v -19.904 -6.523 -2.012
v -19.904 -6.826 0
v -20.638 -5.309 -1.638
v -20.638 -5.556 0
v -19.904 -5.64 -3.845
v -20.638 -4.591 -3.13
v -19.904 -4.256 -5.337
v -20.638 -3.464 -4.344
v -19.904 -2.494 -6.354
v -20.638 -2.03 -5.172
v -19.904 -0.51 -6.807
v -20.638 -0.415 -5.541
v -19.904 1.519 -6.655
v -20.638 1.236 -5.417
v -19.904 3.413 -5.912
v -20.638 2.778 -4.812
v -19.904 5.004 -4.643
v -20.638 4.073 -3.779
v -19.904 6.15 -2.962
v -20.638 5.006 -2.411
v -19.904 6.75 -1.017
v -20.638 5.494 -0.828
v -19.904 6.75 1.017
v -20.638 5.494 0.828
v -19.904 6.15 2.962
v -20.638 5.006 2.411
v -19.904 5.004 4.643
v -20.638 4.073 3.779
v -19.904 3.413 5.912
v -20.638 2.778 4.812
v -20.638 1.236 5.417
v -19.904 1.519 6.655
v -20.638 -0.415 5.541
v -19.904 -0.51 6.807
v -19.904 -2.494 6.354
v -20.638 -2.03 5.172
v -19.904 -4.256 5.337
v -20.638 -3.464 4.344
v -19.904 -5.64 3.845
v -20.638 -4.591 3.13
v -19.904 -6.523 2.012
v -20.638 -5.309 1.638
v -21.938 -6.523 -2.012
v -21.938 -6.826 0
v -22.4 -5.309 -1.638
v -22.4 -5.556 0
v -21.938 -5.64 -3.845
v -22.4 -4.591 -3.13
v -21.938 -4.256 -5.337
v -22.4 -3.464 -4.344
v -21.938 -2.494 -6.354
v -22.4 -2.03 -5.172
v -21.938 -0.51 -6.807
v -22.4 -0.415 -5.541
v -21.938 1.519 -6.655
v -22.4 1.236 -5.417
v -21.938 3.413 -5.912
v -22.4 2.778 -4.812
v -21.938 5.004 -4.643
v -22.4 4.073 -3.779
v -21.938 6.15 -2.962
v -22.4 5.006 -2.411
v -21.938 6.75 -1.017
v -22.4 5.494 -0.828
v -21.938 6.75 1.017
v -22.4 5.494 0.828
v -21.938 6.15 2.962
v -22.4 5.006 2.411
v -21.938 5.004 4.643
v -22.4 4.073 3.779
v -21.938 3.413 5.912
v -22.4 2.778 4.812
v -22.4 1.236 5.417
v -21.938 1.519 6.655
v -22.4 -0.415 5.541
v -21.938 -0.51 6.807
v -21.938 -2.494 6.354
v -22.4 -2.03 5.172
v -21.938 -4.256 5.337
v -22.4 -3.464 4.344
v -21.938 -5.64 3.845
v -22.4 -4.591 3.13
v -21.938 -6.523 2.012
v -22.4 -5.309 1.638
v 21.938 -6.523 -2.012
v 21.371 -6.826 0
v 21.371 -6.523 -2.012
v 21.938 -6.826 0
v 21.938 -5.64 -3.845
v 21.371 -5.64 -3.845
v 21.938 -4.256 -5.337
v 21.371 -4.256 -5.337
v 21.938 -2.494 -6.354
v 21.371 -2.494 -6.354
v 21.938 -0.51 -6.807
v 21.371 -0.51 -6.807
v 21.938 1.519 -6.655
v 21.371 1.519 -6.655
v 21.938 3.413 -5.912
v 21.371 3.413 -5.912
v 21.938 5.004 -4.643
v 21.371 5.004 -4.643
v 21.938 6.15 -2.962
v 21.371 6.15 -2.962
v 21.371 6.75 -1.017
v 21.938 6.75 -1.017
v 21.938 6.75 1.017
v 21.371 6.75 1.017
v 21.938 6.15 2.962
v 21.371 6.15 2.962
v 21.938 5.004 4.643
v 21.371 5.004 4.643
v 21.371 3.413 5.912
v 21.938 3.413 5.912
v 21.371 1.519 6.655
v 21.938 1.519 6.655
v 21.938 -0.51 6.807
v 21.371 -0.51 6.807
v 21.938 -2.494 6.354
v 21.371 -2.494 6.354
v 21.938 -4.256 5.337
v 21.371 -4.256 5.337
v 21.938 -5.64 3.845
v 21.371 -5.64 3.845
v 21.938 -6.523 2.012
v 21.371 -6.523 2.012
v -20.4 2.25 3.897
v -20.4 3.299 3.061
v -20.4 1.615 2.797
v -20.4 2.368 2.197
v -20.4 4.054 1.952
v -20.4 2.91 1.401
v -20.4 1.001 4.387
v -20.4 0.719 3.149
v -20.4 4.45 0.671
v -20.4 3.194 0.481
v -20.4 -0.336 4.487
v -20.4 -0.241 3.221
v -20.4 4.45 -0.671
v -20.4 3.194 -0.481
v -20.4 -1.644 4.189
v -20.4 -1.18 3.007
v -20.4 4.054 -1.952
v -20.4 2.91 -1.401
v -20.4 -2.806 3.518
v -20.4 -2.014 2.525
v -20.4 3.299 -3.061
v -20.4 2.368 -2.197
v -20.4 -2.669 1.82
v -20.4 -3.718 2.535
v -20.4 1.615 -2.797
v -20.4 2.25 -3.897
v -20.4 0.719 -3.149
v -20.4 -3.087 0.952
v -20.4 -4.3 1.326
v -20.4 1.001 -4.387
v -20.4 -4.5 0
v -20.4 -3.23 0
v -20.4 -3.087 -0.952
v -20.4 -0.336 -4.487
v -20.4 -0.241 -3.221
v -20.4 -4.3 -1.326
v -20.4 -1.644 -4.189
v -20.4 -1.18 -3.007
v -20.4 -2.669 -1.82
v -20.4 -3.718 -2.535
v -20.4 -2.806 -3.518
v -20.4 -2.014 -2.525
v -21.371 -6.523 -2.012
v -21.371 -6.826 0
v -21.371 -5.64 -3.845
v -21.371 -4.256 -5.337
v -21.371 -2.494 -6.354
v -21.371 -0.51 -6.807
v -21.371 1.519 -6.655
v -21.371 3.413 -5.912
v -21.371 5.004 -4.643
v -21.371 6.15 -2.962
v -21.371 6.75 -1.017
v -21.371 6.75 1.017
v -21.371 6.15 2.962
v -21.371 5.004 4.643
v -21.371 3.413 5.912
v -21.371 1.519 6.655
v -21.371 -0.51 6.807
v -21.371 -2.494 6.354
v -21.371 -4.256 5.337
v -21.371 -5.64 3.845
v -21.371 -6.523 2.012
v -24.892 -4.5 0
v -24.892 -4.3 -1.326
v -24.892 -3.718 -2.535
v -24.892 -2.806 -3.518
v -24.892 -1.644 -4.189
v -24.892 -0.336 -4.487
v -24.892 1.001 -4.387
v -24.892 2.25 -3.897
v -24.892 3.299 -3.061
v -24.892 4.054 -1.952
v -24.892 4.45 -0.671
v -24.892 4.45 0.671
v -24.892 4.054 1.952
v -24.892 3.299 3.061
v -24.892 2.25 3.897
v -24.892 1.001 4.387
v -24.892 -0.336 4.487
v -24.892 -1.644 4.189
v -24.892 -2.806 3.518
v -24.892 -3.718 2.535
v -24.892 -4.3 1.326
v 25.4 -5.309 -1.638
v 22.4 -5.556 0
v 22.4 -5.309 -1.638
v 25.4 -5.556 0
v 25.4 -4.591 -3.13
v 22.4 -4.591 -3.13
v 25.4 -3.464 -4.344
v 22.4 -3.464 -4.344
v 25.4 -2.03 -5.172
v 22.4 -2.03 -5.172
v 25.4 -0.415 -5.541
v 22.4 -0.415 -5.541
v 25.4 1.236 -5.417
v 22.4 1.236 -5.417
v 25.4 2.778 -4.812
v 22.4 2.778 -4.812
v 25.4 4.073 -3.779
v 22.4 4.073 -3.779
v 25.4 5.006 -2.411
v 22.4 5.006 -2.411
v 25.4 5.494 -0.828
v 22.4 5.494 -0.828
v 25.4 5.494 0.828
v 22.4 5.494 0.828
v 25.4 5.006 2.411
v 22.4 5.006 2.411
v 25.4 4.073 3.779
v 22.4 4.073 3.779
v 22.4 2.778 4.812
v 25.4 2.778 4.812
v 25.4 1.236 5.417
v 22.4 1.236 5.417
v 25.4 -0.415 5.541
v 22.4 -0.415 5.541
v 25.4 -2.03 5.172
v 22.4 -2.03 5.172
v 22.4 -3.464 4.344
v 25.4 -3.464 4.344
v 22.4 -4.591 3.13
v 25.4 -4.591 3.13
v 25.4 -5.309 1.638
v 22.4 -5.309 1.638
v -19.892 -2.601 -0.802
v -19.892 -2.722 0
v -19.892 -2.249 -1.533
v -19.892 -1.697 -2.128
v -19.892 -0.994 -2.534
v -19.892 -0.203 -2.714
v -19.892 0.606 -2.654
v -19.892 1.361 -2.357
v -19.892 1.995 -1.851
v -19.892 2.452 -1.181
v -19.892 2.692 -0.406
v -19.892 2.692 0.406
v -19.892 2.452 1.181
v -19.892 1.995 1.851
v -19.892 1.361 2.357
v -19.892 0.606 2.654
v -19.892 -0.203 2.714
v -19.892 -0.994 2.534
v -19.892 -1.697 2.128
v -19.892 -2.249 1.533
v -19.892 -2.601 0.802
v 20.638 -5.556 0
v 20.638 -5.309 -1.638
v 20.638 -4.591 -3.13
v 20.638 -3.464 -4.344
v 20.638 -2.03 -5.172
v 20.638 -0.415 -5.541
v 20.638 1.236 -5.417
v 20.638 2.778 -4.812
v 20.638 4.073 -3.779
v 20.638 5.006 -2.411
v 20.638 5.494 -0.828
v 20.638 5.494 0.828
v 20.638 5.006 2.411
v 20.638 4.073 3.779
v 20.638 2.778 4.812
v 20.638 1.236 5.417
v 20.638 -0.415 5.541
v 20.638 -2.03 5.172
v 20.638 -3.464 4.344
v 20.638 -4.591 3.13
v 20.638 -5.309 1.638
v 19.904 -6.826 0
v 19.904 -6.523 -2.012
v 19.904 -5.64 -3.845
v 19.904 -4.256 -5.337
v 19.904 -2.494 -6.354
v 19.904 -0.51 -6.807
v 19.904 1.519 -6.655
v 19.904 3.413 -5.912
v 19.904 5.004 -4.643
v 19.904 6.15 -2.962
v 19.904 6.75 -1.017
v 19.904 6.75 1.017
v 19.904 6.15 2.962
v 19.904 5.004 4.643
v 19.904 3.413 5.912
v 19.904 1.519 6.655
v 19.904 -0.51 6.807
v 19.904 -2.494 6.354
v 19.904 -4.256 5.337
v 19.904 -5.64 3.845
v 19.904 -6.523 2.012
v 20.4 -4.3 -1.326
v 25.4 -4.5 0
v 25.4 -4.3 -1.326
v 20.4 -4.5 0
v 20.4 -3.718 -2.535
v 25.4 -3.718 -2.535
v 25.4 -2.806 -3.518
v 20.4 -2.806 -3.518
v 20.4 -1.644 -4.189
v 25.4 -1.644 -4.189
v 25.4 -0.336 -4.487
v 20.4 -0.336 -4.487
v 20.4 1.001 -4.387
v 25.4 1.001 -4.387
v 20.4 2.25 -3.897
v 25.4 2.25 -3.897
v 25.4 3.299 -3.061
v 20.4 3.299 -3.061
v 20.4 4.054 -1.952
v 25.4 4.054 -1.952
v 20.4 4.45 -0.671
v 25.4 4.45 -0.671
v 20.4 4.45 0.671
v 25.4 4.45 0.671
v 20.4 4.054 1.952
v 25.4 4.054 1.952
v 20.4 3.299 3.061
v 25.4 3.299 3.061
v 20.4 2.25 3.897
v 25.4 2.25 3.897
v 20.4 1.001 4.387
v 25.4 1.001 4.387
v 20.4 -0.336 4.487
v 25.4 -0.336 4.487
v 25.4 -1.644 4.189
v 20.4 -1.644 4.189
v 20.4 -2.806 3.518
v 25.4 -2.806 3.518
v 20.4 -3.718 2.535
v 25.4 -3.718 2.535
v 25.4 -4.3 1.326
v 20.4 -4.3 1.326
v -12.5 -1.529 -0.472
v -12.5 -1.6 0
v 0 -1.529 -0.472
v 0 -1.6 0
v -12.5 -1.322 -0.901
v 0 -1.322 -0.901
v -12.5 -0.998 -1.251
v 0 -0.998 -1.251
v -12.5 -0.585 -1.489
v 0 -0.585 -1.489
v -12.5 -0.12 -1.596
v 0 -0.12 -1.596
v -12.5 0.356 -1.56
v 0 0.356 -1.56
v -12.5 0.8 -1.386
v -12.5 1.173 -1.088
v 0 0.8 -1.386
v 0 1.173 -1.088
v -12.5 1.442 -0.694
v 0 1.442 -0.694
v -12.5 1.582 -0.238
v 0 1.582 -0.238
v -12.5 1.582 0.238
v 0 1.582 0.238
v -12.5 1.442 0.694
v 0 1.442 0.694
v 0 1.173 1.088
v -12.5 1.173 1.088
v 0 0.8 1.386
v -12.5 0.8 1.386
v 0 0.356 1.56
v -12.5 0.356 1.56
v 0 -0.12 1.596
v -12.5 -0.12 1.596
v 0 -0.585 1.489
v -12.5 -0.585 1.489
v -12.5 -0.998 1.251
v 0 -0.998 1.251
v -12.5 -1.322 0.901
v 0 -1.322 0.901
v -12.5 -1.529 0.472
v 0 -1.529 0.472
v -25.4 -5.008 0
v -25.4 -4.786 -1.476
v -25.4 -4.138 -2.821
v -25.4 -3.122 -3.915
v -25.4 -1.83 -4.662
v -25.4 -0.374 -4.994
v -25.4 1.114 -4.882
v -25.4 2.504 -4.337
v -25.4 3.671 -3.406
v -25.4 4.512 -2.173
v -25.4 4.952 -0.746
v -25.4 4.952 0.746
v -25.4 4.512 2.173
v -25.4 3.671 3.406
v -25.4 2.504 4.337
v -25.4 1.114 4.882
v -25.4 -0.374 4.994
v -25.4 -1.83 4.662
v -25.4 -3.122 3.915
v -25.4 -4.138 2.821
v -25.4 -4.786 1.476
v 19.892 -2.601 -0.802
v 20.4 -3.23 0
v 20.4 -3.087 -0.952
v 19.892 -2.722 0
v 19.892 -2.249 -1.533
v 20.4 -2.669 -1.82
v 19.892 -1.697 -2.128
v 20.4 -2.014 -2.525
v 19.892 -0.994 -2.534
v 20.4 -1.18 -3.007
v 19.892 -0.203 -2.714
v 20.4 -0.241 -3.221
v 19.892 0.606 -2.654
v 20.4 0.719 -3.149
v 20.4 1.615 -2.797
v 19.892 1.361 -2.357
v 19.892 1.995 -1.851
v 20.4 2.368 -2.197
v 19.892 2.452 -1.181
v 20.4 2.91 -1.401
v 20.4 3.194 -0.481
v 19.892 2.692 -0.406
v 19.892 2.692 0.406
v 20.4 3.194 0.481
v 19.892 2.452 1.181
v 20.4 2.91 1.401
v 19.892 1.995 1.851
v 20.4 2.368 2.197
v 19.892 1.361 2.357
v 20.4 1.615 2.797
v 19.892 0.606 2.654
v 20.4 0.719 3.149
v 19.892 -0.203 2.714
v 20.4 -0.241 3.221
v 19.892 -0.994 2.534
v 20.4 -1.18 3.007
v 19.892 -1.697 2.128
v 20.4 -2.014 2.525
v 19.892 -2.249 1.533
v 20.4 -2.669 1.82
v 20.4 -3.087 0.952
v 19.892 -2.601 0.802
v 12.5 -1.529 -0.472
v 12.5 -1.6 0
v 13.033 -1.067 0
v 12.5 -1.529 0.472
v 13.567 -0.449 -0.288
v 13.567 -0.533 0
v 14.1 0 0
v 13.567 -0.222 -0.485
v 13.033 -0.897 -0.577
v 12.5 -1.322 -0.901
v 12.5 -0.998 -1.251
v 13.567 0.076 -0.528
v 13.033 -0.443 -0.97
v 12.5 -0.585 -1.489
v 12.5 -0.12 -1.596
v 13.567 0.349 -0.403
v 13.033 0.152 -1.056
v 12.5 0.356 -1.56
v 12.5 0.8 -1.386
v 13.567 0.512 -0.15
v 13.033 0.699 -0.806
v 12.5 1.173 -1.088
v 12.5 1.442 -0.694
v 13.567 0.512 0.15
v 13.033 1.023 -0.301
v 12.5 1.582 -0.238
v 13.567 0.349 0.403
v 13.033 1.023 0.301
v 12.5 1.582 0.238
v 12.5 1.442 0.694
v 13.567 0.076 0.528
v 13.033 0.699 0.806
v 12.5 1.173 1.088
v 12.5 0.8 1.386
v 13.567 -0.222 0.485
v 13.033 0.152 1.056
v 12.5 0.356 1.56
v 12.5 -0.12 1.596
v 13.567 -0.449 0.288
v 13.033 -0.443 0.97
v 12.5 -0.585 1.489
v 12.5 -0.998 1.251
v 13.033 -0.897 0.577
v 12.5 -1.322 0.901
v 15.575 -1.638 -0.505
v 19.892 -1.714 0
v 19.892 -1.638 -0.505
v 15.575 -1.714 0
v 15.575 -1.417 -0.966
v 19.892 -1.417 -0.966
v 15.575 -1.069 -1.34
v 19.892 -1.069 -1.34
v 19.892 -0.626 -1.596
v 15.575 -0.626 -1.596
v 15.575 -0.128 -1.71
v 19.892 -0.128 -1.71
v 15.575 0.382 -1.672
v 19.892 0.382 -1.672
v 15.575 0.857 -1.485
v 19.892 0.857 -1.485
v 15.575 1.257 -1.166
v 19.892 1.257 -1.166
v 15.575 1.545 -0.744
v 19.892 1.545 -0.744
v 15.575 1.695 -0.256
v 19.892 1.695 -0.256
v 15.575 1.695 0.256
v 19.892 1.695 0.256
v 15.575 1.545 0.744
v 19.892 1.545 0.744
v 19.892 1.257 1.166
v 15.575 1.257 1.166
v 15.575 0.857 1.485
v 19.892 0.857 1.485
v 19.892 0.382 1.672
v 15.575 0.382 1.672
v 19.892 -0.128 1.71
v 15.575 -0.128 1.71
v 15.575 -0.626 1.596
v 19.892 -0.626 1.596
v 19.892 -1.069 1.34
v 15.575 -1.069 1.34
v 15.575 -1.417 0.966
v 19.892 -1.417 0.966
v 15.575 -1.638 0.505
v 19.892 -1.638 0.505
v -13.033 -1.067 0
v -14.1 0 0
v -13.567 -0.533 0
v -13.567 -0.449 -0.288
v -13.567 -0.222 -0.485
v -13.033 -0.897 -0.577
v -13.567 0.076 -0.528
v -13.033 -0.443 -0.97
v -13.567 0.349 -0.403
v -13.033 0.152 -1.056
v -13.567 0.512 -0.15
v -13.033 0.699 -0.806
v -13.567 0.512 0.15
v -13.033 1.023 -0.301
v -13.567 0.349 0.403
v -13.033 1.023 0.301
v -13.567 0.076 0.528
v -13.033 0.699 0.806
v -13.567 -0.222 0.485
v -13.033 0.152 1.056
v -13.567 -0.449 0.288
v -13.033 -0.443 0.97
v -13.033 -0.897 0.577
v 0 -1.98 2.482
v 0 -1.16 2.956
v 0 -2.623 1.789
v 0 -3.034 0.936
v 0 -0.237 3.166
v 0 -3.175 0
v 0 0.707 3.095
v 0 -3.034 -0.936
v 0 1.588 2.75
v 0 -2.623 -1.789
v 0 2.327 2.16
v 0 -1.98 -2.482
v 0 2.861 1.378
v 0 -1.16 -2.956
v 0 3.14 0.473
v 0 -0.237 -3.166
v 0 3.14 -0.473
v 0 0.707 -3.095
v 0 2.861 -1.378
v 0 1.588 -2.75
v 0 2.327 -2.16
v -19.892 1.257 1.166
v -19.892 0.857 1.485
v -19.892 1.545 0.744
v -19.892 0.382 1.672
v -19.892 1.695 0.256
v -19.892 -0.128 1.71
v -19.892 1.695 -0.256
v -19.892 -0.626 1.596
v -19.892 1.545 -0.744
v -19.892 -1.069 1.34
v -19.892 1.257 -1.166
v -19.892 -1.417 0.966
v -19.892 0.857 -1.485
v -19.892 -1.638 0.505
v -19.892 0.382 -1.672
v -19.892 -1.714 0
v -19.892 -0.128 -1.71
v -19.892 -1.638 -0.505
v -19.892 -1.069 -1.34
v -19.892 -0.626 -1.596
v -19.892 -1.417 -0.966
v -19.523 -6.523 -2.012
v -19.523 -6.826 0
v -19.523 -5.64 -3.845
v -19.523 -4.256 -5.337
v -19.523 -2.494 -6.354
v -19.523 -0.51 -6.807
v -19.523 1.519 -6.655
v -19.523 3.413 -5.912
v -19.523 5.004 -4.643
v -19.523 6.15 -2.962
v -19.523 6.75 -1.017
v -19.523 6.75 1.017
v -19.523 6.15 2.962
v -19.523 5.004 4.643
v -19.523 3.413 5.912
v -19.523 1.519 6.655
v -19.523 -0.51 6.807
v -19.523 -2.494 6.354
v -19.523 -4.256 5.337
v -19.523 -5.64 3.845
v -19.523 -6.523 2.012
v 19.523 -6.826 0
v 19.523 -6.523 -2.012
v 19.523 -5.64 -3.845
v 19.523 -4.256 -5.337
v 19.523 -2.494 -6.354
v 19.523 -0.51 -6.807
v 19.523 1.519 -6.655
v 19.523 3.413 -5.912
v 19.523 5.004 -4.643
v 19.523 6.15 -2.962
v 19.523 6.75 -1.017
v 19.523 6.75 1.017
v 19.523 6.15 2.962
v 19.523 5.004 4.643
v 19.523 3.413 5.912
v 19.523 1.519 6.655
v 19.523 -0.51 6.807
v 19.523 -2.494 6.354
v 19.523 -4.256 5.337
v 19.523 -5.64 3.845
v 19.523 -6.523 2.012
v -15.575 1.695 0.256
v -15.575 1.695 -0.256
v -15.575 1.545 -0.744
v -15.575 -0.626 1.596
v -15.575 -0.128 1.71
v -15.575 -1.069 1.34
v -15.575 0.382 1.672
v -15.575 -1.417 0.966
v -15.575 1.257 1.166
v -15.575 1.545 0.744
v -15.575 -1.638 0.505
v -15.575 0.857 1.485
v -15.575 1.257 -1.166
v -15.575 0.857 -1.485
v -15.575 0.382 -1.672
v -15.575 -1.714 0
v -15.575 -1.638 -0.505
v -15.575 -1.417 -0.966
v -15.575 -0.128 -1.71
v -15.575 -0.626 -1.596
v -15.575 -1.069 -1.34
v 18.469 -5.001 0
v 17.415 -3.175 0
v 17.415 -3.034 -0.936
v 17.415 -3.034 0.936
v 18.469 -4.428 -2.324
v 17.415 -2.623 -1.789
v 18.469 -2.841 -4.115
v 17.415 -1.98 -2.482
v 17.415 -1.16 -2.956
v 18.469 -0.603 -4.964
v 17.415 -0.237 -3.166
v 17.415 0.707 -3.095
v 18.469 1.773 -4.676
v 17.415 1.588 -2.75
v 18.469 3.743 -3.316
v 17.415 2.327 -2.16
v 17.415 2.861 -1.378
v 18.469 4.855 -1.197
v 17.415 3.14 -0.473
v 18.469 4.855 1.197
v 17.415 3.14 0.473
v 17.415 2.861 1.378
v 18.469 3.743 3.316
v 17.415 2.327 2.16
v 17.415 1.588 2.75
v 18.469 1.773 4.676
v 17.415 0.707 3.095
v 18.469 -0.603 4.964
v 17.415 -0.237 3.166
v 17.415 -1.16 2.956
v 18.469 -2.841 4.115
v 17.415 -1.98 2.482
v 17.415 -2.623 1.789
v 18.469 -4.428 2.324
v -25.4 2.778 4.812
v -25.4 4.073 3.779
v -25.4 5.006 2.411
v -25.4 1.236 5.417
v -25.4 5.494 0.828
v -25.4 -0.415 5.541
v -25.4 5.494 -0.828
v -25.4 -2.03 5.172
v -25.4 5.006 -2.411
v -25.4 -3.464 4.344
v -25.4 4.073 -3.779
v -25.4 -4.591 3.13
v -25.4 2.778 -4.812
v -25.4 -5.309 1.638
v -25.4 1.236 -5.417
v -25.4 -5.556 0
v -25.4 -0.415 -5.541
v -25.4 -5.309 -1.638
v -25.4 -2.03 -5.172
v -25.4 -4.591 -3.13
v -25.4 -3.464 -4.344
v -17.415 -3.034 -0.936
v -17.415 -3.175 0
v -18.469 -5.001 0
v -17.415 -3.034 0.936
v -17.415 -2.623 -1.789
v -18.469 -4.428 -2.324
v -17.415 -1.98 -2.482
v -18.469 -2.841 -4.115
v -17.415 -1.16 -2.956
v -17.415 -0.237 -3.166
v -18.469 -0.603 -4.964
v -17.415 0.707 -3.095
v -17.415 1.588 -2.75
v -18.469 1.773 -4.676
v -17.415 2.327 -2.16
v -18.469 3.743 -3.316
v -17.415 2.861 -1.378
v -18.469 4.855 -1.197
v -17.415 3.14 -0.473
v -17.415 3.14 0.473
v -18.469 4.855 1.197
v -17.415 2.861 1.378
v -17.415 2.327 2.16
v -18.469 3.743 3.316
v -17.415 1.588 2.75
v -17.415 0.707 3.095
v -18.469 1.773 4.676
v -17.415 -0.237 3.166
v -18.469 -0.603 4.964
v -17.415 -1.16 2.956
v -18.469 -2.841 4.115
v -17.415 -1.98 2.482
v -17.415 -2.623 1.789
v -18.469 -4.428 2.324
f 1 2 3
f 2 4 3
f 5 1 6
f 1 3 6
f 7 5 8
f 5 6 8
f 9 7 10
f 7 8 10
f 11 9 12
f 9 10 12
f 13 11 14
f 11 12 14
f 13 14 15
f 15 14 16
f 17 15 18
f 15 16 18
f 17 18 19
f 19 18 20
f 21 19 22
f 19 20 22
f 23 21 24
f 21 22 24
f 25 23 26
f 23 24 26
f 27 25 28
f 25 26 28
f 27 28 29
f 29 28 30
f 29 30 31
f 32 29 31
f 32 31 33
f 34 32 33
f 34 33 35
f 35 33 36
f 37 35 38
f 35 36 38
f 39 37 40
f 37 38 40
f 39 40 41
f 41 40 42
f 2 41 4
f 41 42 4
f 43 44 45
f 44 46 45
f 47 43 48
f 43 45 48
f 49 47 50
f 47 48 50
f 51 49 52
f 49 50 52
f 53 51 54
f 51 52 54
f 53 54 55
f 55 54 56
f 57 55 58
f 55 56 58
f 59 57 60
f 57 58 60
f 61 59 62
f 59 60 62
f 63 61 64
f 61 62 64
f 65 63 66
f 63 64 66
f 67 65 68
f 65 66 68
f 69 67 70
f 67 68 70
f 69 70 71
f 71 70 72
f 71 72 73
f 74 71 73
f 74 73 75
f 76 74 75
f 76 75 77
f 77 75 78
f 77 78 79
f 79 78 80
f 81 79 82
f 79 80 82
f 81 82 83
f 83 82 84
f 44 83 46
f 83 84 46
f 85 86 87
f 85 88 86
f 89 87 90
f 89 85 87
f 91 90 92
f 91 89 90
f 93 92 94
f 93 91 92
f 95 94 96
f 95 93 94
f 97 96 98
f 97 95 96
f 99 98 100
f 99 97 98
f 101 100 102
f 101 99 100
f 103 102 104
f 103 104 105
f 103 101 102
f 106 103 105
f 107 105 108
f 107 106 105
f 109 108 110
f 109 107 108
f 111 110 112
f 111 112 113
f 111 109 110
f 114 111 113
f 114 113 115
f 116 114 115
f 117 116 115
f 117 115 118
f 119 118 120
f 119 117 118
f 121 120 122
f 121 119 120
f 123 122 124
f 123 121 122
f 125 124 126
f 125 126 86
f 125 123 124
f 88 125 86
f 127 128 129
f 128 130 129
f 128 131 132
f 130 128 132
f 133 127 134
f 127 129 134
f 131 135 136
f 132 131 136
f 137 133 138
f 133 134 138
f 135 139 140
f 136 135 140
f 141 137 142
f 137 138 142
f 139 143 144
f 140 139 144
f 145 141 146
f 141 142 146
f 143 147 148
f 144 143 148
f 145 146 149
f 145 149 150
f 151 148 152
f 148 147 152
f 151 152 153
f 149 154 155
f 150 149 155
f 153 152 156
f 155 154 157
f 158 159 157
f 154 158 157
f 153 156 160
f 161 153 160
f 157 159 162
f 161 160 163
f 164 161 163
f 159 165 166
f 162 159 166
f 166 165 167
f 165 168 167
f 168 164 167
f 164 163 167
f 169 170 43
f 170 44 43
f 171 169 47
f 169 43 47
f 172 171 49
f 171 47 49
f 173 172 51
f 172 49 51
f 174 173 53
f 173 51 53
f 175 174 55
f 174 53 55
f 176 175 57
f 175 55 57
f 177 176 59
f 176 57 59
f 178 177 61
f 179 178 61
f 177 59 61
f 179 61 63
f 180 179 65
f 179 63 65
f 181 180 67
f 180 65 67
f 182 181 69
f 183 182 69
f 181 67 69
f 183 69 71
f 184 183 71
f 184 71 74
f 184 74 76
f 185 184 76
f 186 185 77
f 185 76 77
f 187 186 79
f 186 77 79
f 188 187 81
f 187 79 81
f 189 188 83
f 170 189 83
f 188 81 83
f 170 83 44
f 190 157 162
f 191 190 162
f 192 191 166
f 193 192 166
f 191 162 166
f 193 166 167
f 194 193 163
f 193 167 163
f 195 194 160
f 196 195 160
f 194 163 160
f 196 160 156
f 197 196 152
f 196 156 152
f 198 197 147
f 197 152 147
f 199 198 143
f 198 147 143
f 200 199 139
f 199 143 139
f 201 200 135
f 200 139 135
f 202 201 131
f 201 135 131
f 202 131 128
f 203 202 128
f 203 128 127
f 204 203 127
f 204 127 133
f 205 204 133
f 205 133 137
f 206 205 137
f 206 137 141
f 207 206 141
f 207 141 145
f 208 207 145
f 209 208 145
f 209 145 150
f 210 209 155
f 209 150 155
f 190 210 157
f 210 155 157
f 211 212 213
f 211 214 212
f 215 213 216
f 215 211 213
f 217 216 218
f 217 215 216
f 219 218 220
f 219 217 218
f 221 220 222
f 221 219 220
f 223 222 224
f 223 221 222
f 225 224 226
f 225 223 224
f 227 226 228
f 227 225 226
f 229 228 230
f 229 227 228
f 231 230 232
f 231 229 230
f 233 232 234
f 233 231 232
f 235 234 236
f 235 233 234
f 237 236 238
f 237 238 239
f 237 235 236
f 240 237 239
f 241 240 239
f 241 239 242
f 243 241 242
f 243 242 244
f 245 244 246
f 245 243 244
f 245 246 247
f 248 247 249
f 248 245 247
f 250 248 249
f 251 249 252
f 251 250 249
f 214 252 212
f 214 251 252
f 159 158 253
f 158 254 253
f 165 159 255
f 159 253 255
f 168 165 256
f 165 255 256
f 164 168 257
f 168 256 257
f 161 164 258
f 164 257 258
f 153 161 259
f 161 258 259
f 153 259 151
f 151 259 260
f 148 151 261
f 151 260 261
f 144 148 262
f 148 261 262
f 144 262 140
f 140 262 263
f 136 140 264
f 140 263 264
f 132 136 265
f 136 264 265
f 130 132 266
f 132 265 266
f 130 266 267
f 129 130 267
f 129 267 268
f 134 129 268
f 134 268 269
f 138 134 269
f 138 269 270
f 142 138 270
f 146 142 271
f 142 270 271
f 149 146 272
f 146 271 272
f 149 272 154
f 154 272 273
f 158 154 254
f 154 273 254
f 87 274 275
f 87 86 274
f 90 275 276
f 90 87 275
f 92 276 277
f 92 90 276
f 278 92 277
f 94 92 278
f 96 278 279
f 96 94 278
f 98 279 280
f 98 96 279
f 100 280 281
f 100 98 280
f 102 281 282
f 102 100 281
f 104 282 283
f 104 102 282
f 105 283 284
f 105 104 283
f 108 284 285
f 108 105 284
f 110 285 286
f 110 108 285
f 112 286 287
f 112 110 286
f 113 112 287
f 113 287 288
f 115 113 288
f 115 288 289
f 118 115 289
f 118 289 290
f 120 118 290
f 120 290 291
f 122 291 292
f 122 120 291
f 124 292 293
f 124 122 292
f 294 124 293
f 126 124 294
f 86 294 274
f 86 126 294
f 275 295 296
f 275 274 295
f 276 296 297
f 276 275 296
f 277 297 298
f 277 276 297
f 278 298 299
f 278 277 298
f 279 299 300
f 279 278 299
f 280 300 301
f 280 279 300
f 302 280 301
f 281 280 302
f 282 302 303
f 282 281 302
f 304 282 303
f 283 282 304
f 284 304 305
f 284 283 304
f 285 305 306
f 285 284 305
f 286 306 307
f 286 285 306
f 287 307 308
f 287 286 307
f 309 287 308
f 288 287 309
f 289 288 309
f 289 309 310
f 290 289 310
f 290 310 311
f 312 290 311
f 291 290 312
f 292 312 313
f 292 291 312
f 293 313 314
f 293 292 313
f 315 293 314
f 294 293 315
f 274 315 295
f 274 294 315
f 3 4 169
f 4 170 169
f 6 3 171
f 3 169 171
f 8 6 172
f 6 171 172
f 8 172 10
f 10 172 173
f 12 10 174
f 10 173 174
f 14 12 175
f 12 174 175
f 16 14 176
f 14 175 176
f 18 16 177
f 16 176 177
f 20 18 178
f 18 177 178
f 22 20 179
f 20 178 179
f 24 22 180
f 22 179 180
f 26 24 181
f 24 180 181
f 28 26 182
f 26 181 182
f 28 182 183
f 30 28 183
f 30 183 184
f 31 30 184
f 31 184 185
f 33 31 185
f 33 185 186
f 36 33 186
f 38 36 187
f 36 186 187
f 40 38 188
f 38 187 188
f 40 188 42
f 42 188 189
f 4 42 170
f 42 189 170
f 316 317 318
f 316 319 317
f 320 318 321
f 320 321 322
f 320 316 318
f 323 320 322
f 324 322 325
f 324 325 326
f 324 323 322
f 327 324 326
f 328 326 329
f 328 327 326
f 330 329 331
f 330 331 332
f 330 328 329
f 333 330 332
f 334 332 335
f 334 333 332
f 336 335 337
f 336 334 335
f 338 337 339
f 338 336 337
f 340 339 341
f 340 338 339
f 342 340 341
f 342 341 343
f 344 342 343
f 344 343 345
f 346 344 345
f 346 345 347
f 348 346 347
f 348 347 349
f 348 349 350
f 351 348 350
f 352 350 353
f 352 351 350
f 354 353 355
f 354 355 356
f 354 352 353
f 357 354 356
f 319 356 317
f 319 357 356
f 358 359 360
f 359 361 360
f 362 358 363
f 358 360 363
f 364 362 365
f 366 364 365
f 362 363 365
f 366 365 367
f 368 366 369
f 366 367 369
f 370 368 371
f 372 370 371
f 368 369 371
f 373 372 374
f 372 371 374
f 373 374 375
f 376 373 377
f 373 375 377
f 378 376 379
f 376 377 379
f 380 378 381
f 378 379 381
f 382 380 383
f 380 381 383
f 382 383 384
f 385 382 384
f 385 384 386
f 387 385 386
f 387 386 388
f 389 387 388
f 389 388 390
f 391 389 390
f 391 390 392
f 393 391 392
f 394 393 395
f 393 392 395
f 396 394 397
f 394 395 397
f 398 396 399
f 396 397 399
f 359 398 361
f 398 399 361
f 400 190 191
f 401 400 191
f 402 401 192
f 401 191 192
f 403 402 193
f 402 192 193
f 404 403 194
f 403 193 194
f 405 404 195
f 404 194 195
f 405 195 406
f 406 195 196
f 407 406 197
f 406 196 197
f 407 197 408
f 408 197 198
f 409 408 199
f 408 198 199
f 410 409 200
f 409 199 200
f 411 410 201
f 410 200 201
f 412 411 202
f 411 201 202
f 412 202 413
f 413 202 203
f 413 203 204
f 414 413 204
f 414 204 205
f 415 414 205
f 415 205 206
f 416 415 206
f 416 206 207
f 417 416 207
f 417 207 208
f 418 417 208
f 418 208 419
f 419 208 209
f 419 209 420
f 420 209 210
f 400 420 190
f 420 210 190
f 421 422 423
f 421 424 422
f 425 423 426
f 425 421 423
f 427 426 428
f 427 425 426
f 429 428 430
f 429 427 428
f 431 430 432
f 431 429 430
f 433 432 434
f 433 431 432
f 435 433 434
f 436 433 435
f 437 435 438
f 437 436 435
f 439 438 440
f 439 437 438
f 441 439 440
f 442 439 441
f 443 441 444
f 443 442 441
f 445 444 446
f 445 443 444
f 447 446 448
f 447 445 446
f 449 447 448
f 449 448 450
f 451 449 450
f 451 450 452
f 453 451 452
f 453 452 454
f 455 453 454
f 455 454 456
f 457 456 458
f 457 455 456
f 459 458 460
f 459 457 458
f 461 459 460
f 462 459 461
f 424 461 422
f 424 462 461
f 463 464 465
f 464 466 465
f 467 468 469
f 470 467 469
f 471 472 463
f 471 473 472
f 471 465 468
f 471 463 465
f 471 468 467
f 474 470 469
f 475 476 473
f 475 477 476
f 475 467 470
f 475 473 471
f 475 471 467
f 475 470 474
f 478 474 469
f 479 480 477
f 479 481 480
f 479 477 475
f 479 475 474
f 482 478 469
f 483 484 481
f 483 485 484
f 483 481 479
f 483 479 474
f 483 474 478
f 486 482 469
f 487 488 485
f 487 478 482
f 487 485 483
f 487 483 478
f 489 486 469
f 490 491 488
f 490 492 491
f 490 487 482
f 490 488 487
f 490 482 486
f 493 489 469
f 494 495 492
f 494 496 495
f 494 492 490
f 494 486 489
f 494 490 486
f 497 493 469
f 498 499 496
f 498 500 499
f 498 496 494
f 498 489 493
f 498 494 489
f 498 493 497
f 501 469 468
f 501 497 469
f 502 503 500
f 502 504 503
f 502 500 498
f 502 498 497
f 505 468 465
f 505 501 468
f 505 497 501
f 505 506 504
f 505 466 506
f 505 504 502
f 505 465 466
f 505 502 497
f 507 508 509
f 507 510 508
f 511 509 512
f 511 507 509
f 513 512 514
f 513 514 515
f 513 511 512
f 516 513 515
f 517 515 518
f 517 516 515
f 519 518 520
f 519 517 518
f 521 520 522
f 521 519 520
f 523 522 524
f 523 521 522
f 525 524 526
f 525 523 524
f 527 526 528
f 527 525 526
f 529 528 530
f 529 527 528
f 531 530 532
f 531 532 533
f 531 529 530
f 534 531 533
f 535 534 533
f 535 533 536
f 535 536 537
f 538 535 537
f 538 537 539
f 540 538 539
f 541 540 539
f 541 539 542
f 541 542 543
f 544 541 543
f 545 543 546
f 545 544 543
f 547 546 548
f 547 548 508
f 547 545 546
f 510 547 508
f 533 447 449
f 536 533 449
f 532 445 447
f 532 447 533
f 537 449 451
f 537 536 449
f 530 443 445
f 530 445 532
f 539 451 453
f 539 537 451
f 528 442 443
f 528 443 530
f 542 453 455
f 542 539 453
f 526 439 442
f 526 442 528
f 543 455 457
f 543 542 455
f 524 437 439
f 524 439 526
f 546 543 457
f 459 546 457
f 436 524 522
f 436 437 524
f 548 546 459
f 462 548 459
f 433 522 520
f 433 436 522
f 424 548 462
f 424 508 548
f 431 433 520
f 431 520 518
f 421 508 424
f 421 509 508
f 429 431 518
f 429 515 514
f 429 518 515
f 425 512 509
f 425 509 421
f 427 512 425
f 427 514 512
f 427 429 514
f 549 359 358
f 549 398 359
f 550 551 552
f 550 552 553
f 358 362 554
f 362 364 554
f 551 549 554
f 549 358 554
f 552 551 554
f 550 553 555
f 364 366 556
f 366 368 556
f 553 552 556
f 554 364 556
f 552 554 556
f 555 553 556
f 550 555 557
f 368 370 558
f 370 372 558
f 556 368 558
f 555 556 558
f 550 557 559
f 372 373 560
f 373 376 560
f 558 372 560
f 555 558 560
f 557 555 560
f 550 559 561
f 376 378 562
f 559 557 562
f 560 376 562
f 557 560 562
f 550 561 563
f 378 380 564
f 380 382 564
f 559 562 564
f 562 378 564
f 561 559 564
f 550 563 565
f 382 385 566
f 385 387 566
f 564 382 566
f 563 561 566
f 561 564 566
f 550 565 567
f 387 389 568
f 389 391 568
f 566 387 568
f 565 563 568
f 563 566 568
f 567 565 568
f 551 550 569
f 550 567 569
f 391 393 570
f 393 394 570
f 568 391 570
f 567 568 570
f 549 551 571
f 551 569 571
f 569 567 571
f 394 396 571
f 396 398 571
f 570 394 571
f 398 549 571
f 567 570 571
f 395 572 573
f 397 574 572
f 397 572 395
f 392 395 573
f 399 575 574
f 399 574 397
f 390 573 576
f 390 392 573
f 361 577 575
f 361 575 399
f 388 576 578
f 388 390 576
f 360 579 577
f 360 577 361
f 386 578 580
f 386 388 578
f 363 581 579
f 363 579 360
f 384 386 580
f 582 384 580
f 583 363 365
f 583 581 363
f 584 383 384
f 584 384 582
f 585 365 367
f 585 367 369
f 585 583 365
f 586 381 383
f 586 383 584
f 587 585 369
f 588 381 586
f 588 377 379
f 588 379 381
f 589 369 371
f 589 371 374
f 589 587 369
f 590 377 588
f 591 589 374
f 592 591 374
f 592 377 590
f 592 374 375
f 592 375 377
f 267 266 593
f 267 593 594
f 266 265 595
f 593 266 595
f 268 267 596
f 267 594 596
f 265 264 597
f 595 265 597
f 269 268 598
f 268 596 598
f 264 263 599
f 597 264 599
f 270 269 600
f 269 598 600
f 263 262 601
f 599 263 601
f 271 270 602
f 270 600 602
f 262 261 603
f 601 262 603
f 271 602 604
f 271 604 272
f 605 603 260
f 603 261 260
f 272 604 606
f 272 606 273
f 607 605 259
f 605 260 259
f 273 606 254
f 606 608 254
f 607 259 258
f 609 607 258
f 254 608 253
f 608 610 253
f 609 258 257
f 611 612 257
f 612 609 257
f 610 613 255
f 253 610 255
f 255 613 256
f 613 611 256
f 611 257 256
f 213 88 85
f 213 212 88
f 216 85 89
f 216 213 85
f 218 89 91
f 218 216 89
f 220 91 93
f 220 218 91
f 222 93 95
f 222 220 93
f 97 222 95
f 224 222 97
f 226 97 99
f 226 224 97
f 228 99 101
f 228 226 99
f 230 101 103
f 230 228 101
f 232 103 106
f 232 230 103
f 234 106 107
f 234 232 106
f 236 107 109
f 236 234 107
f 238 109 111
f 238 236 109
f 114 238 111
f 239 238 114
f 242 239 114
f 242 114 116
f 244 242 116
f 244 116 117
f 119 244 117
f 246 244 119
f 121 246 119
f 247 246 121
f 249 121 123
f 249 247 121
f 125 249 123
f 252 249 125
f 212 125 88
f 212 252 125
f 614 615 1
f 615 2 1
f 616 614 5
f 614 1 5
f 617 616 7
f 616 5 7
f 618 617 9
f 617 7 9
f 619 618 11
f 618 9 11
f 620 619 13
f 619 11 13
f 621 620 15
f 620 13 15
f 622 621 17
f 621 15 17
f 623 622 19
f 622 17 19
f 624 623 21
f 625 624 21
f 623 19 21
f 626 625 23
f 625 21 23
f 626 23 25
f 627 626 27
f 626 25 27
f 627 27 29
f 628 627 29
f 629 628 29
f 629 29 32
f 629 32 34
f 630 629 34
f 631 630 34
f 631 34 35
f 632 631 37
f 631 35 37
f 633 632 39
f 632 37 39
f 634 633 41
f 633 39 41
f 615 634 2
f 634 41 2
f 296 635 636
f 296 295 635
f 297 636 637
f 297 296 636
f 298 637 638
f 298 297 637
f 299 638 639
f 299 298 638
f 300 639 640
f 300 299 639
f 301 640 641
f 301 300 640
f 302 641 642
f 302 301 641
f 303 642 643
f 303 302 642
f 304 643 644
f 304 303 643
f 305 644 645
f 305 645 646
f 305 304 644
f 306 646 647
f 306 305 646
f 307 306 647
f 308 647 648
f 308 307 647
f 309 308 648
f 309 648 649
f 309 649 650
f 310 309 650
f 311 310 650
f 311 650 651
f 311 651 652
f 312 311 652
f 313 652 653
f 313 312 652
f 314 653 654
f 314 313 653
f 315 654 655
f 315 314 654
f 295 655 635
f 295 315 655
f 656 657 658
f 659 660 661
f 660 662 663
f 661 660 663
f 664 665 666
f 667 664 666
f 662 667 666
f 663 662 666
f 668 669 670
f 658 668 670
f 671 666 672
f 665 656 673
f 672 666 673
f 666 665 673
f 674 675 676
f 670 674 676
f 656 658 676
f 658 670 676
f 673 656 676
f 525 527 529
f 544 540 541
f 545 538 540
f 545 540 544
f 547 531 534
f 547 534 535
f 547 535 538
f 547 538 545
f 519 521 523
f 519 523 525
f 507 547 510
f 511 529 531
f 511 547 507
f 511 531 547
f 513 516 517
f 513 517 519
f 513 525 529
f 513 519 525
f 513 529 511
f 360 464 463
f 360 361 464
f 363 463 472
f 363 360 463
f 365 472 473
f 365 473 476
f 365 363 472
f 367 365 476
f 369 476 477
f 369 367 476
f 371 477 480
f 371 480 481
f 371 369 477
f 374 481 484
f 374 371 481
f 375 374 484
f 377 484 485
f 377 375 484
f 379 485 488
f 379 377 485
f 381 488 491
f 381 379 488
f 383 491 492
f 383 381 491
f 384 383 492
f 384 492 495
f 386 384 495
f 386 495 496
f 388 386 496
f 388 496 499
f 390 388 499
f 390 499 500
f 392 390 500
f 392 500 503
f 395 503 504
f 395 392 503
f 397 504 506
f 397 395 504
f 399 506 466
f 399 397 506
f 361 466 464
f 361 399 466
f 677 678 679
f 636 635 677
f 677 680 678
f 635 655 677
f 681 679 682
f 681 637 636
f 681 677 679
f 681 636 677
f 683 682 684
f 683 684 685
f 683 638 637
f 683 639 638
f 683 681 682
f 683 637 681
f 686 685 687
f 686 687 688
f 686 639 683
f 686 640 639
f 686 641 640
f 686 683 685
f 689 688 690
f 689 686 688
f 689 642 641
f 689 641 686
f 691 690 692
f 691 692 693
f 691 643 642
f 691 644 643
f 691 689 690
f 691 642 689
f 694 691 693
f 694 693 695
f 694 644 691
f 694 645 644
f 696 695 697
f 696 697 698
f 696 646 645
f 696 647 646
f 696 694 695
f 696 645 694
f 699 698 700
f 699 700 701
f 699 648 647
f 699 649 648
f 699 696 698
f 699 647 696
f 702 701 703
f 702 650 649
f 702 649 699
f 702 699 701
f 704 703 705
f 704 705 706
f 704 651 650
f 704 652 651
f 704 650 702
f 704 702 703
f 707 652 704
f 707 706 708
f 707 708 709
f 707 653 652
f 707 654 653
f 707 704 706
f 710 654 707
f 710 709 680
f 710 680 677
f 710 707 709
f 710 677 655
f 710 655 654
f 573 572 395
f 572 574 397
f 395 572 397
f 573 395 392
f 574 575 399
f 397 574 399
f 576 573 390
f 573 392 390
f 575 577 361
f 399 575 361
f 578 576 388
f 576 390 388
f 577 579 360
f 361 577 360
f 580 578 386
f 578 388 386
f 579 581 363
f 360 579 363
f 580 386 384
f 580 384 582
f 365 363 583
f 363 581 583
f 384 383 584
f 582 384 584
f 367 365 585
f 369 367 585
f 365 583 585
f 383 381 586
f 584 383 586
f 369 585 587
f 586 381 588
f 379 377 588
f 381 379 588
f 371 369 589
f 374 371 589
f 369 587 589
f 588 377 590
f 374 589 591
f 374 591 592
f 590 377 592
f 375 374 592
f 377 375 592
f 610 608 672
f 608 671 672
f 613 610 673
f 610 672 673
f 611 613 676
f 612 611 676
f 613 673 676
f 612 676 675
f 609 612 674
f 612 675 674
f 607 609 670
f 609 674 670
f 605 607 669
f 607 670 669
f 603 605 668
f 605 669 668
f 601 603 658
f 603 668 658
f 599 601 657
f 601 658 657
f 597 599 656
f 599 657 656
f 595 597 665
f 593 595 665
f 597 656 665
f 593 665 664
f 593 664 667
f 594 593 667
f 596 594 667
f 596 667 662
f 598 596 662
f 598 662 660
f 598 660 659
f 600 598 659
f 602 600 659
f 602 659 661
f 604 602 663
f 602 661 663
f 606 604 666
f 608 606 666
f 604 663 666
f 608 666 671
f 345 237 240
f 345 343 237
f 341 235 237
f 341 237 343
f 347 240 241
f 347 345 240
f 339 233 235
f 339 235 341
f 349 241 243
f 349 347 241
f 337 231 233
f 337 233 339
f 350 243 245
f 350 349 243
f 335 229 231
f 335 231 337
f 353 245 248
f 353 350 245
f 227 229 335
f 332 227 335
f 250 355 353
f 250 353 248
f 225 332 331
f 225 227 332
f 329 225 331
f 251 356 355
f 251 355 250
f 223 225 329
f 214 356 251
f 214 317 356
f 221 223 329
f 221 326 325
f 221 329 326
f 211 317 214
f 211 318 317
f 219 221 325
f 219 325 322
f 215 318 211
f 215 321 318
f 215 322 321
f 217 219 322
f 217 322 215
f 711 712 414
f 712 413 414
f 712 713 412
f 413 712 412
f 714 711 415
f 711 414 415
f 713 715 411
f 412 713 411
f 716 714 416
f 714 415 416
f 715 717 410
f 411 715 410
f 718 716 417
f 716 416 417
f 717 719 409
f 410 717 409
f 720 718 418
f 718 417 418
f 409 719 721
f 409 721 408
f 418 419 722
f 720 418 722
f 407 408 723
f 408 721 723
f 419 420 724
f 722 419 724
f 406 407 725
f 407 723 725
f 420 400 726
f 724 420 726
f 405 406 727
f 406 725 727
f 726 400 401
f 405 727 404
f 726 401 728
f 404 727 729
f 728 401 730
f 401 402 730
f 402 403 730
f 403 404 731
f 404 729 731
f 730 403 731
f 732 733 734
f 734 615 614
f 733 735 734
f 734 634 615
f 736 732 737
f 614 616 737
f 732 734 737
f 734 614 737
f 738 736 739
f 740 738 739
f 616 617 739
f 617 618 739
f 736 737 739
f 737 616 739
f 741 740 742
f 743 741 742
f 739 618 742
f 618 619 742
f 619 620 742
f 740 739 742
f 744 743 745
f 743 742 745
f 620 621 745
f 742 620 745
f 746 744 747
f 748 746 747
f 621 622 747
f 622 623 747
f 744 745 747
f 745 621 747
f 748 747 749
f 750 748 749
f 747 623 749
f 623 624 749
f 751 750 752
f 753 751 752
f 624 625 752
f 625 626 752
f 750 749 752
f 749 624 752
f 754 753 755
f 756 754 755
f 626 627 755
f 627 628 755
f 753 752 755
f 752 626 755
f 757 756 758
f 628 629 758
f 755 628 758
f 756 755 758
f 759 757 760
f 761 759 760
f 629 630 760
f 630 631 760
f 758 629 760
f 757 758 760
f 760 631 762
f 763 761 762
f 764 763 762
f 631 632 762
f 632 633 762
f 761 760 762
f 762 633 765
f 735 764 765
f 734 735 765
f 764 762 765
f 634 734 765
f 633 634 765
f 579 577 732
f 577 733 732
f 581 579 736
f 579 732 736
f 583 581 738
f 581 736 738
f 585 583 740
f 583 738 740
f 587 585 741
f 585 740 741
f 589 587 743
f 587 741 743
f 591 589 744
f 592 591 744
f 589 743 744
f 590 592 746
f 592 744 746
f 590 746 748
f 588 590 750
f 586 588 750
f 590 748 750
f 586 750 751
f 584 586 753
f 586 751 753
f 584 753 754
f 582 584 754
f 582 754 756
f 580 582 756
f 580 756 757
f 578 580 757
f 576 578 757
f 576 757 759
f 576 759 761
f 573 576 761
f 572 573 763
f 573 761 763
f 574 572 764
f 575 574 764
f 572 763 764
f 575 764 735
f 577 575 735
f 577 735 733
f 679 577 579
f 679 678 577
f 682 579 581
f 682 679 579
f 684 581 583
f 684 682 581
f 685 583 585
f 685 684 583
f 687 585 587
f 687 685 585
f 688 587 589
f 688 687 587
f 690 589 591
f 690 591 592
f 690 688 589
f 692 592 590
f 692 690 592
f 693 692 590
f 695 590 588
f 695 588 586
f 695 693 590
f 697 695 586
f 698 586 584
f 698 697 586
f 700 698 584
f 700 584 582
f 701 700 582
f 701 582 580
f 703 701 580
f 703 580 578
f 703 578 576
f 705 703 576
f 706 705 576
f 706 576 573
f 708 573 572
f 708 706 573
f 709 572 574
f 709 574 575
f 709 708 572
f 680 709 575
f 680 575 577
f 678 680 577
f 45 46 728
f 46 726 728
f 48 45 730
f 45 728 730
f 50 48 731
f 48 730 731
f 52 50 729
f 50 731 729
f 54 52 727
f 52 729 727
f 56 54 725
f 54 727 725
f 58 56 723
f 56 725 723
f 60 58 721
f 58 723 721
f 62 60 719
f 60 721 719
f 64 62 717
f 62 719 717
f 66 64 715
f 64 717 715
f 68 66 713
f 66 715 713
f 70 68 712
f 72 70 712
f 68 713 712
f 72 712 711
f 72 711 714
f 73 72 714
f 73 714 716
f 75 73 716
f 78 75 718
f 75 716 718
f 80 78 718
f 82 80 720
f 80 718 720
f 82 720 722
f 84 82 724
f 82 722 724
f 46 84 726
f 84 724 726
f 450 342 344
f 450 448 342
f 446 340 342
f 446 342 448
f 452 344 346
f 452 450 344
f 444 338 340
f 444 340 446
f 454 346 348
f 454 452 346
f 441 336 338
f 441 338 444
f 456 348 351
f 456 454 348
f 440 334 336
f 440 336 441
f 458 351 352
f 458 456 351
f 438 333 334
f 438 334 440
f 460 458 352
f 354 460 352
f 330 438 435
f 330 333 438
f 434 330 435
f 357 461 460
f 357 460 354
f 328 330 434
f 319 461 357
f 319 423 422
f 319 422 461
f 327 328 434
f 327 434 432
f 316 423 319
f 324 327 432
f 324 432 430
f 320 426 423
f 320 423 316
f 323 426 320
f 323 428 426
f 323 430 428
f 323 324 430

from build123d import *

# Parameters (mm, degrees)
CHAMFER1_SIZE = 0.508


with BuildPart() as part:
    # Sketch2 → Revolve1 (revolve)
    with BuildSketch(Plane.XY, mode=Mode.PRIVATE) as revolve1_sk:
        Polygon((-22.4, 5.55625), (-25.4, 5.55625), (-25.4, 4.5), (-20.4, 4.5), (-20.4, 3.23), (-19.892, 2.722), (-19.892, 1.7145), (-15.575, 1.7145), (-15.575, 0), (-14.1, 0), (-12.5, 1.6), (0, 1.6), (0, 3.175), (-17.415214988, 3.175), (-19.523265158, 6.82625), (-19.904265158, 6.82625), (-20.6375, 5.55625), (-21.370734842, 6.82625), (-21.937757802, 6.82625), align=None)
    revolve(revolve1_sk.sketch.rotate(Axis((-25.4, 0, 0), (1, 0, 0)), 180), axis=Axis((-25.4, 0, 0), (1, 0, 0)))


with BuildPart() as body_2:
    # Mirror1: mirrored copy
    add(part.part.mirror(Plane(origin=(0, 0, 0), x_dir=(0, 0, 1), z_dir=(1, 0, 0))))


with BuildPart() as part_1:
    add(part.part)

    # Chamfer1
    chamfer1_edges = [part_1.edges().sort_by_distance(p)[0] for p in [
        (-25.4, 4.5, 0),
    ]]
    chamfer(chamfer1_edges, length=CHAMFER1_SIZE)


solid = Compound([body_2.part, part_1.part])
